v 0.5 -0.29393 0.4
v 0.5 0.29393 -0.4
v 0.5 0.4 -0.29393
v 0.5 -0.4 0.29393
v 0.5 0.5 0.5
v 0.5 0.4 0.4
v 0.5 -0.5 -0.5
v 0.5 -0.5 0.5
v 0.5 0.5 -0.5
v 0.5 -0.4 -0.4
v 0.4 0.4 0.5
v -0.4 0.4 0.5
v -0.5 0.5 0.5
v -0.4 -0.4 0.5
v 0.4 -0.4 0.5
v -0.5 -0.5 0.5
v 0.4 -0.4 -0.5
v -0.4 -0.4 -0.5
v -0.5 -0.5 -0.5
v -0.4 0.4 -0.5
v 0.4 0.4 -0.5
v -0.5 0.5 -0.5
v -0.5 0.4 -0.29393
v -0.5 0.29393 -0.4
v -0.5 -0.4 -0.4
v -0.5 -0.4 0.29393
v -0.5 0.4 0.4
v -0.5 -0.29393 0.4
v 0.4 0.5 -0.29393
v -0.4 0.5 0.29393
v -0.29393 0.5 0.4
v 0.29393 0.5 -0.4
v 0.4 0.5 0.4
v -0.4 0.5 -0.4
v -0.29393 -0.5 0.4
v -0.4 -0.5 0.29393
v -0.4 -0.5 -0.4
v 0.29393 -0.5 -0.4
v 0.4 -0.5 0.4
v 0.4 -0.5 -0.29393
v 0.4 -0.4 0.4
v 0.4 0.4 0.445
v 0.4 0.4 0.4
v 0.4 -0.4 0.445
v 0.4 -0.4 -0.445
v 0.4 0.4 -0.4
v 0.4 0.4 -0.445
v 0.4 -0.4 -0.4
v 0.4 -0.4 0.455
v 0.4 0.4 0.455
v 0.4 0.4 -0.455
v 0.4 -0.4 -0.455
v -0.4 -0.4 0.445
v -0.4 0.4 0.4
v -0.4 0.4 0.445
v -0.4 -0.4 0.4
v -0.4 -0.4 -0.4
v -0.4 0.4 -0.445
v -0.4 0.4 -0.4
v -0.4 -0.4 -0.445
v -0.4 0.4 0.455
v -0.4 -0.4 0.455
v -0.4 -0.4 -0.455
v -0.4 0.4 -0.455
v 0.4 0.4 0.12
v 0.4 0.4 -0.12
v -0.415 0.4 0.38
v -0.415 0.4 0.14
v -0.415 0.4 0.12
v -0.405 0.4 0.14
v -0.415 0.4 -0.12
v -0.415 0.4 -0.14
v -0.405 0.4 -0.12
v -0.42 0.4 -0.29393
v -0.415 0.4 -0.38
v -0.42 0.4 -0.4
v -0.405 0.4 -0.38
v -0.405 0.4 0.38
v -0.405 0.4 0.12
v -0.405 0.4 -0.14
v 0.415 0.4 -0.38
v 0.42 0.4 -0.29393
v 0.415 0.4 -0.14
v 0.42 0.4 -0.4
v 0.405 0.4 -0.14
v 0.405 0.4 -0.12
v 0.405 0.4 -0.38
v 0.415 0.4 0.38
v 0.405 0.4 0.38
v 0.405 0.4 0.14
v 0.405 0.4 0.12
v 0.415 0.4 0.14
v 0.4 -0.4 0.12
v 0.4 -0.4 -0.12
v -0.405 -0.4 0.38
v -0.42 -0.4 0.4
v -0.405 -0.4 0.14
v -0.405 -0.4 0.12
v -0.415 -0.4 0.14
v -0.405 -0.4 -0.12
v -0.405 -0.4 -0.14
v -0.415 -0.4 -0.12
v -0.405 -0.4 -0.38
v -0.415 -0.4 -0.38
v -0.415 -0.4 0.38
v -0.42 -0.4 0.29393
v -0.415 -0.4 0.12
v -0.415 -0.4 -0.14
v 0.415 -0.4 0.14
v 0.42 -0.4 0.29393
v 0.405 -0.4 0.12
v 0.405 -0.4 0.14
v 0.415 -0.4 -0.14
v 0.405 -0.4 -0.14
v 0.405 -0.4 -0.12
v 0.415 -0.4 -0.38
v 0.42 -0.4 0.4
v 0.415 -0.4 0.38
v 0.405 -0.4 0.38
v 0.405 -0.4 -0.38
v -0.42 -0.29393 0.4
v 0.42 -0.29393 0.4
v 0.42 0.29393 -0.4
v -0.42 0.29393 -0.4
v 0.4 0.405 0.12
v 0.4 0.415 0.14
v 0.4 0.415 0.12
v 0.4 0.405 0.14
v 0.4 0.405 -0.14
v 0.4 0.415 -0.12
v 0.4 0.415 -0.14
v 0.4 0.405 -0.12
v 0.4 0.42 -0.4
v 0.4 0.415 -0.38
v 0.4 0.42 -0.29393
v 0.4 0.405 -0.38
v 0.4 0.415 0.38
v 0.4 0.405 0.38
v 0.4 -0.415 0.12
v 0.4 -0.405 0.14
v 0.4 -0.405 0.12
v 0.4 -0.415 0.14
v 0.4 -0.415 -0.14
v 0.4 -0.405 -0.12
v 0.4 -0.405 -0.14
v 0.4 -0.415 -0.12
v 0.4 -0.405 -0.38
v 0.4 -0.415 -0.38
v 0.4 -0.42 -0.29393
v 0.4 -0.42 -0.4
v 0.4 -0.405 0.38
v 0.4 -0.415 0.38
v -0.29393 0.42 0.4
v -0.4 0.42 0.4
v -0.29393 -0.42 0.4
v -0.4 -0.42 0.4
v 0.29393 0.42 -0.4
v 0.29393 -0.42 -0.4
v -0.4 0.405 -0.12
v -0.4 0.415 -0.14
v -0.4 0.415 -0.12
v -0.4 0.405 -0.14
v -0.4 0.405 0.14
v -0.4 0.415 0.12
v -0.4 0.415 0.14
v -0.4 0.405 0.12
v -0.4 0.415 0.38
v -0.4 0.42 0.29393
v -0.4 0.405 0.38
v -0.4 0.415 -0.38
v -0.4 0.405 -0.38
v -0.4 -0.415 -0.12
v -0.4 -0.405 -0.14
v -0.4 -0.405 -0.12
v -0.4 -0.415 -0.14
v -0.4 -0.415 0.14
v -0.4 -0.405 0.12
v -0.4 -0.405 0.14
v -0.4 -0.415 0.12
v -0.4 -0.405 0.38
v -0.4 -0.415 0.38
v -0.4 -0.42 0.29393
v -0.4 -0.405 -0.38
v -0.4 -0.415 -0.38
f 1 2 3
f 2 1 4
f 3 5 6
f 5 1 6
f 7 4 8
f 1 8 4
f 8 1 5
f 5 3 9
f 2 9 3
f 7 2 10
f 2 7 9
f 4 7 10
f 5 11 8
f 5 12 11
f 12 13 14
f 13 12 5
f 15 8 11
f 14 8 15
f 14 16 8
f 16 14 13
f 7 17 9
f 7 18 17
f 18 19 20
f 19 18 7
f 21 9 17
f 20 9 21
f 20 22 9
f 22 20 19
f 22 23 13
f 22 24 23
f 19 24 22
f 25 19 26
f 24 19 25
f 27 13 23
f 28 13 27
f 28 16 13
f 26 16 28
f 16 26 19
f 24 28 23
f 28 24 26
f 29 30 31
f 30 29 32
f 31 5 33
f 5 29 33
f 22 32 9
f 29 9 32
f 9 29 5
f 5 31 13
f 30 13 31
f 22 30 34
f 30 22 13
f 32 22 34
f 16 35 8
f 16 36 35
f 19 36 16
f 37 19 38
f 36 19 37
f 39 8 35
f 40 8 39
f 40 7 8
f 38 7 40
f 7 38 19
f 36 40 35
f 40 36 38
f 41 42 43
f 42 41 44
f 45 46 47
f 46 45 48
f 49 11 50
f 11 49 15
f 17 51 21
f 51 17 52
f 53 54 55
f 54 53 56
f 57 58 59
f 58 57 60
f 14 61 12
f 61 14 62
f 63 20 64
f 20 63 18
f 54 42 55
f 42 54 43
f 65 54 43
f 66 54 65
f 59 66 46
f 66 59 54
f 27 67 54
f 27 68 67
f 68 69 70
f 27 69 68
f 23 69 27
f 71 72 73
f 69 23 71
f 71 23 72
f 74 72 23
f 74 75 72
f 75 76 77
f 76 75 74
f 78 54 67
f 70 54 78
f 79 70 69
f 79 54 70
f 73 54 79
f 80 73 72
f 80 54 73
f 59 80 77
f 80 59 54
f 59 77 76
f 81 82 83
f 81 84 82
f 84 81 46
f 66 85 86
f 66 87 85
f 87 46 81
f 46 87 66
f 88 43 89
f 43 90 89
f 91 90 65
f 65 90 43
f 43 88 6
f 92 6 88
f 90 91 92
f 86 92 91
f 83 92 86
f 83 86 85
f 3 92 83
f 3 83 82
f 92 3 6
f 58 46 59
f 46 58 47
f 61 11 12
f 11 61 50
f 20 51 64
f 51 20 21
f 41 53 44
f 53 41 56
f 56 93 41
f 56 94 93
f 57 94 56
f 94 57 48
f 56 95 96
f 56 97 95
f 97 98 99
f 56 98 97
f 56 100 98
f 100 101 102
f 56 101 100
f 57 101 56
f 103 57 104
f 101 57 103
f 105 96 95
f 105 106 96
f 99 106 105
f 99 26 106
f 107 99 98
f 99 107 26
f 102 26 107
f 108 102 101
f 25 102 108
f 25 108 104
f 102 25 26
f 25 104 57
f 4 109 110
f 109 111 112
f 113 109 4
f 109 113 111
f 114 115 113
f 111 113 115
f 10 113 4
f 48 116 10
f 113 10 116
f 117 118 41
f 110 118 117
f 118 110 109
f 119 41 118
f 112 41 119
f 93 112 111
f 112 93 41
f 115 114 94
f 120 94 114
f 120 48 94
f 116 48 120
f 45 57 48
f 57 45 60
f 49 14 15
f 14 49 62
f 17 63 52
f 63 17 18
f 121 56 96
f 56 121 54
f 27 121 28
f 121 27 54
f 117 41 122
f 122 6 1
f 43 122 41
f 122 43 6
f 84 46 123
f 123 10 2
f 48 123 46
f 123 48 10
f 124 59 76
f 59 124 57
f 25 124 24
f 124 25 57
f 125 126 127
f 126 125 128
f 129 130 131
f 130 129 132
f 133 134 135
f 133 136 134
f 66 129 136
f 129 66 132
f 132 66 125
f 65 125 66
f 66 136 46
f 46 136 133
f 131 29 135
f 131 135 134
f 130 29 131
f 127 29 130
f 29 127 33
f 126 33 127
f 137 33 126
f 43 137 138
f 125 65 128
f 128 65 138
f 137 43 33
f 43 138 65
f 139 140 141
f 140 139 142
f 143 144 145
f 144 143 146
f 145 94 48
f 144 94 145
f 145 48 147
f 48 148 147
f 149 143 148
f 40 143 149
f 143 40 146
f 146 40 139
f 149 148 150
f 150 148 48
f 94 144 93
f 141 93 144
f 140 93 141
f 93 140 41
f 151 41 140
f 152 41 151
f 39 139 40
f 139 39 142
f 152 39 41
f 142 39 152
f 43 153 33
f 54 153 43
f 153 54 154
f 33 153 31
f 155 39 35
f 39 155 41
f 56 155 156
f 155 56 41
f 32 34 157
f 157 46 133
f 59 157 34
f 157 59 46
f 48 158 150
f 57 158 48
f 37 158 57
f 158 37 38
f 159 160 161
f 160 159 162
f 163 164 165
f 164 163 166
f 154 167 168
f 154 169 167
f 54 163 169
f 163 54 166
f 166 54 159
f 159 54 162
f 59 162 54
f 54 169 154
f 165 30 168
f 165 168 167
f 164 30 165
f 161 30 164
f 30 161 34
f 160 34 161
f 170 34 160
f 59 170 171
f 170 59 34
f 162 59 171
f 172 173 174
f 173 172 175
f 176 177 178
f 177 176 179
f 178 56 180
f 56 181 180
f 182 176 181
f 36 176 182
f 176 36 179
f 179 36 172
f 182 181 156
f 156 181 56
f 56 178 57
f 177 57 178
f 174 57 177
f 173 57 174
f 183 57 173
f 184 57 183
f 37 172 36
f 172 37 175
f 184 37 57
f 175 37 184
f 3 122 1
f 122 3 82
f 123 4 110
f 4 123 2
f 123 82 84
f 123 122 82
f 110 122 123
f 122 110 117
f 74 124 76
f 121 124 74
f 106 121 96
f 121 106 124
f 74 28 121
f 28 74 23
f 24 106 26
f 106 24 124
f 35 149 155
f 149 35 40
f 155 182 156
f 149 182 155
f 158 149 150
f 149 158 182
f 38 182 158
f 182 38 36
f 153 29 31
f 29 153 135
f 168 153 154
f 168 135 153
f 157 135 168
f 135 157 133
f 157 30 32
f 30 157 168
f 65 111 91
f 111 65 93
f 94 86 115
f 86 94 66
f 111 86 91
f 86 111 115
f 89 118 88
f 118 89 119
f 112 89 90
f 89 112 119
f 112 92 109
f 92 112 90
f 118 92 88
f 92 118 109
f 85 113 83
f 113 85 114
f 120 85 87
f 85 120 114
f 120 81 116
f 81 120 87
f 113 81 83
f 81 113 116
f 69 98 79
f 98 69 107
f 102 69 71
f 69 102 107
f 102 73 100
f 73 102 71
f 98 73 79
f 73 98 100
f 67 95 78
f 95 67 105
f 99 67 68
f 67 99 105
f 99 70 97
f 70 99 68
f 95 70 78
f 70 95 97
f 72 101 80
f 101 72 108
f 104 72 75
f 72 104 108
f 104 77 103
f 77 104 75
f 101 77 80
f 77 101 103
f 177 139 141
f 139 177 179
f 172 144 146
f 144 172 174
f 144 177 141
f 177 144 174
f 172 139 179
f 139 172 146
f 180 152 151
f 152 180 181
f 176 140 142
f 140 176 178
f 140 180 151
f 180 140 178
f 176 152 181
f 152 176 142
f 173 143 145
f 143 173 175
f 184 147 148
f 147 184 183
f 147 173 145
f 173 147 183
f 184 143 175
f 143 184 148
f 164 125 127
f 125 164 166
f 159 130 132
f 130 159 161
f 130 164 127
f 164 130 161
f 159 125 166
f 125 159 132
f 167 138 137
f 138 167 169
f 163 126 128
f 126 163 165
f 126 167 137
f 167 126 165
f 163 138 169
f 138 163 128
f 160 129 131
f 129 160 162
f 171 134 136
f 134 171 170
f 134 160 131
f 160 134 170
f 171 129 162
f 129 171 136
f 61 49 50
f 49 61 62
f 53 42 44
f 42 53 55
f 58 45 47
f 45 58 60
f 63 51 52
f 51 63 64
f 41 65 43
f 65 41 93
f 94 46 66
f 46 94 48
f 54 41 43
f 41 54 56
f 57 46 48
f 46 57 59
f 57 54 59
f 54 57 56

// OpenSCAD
module Wood_Crate(){
    union(){
    color("#c69874"){
    difference(){

    cube([1,1,1], center = true);

    cube([0.8,0.8,2], center = true);

    cube([2,0.8,0.8], center = true);

    cube([0.8,2,0.8], center = true);

    }

    translate([0.46,-0.,0])
    rotate([-45,0,0])
    cube([0.08,1.2,0.15], center = true);

    translate([-0.46,-0,0])
    rotate([-45,0,0])
    cube([0.08,1.2,0.15], center = true);

    translate([0,-0.46,0])
    rotate([45,0,90])
    cube([0.08,1.2,0.15], center = true);

    translate([0,0.46,0])
    rotate([45,0,90])
    cube([0.08,1.2,0.15], center = true);

    }
    }

    color("black"){
    cube([0.8,0.8,0.8], center = true);
    }

    color("#bc6a3c"){
    translate([0.4,0,0.0])
    rotate([0,0,90])
    cube([0.8,0.01,0.24], center = true);

    translate([0.41,0,0.26])
    rotate([0,0,90])
    cube([0.8,0.01,0.24], center = true);

    translate([0.41,0,-0.26])
    rotate([0,0,90])
    cube([0.8,0.01,0.24], center = true);


    translate([-0.41,0,0.0])
    rotate([0,0,90])
    cube([0.8,0.01,0.24], center = true);

    translate([-0.41,0,0.26])
    rotate([0,0,90])
    cube([0.8,0.01,0.24], center = true);

    translate([-0.41,0,-0.26])
    rotate([0,0,90])
    cube([0.8,0.01,0.24], center = true);



    translate([0,-0.41,0.0])
    rotate([0,0,0])
    cube([0.8,0.01,0.24], center = true);

    translate([0,-0.41,0.26])
    rotate([0,0,0])
    cube([0.8,0.01,0.24], center = true);

    translate([0,-0.41,-0.26])
    rotate([0,0,0])
    cube([0.8,0.01,0.24], center = true);

    translate([0,0.41,0.0])
    rotate([0,0,0])
    cube([0.8,0.01,0.24], center = true);

    translate([0,0.41,0.26])
    rotate([0,0,0])
    cube([0.8,0.01,0.24], center = true);

    translate([0,0.41,-0.26])
    rotate([0,0,0])
    cube([0.8,0.01,0.24], center = true);

    translate([0,0,0.45])
    cube([0.8,0.8,0.01], center = true);

    translate([0,0,-0.45])
    cube([0.8,0.8,0.01], center = true);
    }
}

Wood_Crate();


// Written by Nicolì Angelo (Gengio) 2024: 
// MIT License

//Permission is hereby granted, free of charge, to any person obtaining a copy of this software and associated documentation files (the "Software"), to deal in the Software without restriction, including without limitation the rights to use, copy, modify, merge, publish, distribute, sublicense, and/or sell copies of the Software, and to permit persons to whom the Software is furnished to do so, subject to the following conditions:

//The above copyright notice and this permission notice shall be included in all copies or substantial portions of the Software.

//THE SOFTWARE IS PROVIDED "AS IS", WITHOUT WARRANTY OF ANY KIND, EXPRESS OR IMPLIED, INCLUDING BUT NOT LIMITED TO THE WARRANTIES OF MERCHANTABILITY, FITNESS FOR A PARTICULAR PURPOSE AND NONINFRINGEMENT. IN NO EVENT SHALL THE AUTHORS OR COPYRIGHT HOLDERS BE LIABLE FOR ANY CLAIM, DAMAGES OR OTHER LIABILITY, WHETHER IN AN ACTION OF CONTRACT, TORT OR OTHERWISE, ARISING FROM, OUT OF OR IN CONNECTION WITH THE SOFTWARE OR THE USE OR OTHER DEALINGS IN THE SOFTWARE.
